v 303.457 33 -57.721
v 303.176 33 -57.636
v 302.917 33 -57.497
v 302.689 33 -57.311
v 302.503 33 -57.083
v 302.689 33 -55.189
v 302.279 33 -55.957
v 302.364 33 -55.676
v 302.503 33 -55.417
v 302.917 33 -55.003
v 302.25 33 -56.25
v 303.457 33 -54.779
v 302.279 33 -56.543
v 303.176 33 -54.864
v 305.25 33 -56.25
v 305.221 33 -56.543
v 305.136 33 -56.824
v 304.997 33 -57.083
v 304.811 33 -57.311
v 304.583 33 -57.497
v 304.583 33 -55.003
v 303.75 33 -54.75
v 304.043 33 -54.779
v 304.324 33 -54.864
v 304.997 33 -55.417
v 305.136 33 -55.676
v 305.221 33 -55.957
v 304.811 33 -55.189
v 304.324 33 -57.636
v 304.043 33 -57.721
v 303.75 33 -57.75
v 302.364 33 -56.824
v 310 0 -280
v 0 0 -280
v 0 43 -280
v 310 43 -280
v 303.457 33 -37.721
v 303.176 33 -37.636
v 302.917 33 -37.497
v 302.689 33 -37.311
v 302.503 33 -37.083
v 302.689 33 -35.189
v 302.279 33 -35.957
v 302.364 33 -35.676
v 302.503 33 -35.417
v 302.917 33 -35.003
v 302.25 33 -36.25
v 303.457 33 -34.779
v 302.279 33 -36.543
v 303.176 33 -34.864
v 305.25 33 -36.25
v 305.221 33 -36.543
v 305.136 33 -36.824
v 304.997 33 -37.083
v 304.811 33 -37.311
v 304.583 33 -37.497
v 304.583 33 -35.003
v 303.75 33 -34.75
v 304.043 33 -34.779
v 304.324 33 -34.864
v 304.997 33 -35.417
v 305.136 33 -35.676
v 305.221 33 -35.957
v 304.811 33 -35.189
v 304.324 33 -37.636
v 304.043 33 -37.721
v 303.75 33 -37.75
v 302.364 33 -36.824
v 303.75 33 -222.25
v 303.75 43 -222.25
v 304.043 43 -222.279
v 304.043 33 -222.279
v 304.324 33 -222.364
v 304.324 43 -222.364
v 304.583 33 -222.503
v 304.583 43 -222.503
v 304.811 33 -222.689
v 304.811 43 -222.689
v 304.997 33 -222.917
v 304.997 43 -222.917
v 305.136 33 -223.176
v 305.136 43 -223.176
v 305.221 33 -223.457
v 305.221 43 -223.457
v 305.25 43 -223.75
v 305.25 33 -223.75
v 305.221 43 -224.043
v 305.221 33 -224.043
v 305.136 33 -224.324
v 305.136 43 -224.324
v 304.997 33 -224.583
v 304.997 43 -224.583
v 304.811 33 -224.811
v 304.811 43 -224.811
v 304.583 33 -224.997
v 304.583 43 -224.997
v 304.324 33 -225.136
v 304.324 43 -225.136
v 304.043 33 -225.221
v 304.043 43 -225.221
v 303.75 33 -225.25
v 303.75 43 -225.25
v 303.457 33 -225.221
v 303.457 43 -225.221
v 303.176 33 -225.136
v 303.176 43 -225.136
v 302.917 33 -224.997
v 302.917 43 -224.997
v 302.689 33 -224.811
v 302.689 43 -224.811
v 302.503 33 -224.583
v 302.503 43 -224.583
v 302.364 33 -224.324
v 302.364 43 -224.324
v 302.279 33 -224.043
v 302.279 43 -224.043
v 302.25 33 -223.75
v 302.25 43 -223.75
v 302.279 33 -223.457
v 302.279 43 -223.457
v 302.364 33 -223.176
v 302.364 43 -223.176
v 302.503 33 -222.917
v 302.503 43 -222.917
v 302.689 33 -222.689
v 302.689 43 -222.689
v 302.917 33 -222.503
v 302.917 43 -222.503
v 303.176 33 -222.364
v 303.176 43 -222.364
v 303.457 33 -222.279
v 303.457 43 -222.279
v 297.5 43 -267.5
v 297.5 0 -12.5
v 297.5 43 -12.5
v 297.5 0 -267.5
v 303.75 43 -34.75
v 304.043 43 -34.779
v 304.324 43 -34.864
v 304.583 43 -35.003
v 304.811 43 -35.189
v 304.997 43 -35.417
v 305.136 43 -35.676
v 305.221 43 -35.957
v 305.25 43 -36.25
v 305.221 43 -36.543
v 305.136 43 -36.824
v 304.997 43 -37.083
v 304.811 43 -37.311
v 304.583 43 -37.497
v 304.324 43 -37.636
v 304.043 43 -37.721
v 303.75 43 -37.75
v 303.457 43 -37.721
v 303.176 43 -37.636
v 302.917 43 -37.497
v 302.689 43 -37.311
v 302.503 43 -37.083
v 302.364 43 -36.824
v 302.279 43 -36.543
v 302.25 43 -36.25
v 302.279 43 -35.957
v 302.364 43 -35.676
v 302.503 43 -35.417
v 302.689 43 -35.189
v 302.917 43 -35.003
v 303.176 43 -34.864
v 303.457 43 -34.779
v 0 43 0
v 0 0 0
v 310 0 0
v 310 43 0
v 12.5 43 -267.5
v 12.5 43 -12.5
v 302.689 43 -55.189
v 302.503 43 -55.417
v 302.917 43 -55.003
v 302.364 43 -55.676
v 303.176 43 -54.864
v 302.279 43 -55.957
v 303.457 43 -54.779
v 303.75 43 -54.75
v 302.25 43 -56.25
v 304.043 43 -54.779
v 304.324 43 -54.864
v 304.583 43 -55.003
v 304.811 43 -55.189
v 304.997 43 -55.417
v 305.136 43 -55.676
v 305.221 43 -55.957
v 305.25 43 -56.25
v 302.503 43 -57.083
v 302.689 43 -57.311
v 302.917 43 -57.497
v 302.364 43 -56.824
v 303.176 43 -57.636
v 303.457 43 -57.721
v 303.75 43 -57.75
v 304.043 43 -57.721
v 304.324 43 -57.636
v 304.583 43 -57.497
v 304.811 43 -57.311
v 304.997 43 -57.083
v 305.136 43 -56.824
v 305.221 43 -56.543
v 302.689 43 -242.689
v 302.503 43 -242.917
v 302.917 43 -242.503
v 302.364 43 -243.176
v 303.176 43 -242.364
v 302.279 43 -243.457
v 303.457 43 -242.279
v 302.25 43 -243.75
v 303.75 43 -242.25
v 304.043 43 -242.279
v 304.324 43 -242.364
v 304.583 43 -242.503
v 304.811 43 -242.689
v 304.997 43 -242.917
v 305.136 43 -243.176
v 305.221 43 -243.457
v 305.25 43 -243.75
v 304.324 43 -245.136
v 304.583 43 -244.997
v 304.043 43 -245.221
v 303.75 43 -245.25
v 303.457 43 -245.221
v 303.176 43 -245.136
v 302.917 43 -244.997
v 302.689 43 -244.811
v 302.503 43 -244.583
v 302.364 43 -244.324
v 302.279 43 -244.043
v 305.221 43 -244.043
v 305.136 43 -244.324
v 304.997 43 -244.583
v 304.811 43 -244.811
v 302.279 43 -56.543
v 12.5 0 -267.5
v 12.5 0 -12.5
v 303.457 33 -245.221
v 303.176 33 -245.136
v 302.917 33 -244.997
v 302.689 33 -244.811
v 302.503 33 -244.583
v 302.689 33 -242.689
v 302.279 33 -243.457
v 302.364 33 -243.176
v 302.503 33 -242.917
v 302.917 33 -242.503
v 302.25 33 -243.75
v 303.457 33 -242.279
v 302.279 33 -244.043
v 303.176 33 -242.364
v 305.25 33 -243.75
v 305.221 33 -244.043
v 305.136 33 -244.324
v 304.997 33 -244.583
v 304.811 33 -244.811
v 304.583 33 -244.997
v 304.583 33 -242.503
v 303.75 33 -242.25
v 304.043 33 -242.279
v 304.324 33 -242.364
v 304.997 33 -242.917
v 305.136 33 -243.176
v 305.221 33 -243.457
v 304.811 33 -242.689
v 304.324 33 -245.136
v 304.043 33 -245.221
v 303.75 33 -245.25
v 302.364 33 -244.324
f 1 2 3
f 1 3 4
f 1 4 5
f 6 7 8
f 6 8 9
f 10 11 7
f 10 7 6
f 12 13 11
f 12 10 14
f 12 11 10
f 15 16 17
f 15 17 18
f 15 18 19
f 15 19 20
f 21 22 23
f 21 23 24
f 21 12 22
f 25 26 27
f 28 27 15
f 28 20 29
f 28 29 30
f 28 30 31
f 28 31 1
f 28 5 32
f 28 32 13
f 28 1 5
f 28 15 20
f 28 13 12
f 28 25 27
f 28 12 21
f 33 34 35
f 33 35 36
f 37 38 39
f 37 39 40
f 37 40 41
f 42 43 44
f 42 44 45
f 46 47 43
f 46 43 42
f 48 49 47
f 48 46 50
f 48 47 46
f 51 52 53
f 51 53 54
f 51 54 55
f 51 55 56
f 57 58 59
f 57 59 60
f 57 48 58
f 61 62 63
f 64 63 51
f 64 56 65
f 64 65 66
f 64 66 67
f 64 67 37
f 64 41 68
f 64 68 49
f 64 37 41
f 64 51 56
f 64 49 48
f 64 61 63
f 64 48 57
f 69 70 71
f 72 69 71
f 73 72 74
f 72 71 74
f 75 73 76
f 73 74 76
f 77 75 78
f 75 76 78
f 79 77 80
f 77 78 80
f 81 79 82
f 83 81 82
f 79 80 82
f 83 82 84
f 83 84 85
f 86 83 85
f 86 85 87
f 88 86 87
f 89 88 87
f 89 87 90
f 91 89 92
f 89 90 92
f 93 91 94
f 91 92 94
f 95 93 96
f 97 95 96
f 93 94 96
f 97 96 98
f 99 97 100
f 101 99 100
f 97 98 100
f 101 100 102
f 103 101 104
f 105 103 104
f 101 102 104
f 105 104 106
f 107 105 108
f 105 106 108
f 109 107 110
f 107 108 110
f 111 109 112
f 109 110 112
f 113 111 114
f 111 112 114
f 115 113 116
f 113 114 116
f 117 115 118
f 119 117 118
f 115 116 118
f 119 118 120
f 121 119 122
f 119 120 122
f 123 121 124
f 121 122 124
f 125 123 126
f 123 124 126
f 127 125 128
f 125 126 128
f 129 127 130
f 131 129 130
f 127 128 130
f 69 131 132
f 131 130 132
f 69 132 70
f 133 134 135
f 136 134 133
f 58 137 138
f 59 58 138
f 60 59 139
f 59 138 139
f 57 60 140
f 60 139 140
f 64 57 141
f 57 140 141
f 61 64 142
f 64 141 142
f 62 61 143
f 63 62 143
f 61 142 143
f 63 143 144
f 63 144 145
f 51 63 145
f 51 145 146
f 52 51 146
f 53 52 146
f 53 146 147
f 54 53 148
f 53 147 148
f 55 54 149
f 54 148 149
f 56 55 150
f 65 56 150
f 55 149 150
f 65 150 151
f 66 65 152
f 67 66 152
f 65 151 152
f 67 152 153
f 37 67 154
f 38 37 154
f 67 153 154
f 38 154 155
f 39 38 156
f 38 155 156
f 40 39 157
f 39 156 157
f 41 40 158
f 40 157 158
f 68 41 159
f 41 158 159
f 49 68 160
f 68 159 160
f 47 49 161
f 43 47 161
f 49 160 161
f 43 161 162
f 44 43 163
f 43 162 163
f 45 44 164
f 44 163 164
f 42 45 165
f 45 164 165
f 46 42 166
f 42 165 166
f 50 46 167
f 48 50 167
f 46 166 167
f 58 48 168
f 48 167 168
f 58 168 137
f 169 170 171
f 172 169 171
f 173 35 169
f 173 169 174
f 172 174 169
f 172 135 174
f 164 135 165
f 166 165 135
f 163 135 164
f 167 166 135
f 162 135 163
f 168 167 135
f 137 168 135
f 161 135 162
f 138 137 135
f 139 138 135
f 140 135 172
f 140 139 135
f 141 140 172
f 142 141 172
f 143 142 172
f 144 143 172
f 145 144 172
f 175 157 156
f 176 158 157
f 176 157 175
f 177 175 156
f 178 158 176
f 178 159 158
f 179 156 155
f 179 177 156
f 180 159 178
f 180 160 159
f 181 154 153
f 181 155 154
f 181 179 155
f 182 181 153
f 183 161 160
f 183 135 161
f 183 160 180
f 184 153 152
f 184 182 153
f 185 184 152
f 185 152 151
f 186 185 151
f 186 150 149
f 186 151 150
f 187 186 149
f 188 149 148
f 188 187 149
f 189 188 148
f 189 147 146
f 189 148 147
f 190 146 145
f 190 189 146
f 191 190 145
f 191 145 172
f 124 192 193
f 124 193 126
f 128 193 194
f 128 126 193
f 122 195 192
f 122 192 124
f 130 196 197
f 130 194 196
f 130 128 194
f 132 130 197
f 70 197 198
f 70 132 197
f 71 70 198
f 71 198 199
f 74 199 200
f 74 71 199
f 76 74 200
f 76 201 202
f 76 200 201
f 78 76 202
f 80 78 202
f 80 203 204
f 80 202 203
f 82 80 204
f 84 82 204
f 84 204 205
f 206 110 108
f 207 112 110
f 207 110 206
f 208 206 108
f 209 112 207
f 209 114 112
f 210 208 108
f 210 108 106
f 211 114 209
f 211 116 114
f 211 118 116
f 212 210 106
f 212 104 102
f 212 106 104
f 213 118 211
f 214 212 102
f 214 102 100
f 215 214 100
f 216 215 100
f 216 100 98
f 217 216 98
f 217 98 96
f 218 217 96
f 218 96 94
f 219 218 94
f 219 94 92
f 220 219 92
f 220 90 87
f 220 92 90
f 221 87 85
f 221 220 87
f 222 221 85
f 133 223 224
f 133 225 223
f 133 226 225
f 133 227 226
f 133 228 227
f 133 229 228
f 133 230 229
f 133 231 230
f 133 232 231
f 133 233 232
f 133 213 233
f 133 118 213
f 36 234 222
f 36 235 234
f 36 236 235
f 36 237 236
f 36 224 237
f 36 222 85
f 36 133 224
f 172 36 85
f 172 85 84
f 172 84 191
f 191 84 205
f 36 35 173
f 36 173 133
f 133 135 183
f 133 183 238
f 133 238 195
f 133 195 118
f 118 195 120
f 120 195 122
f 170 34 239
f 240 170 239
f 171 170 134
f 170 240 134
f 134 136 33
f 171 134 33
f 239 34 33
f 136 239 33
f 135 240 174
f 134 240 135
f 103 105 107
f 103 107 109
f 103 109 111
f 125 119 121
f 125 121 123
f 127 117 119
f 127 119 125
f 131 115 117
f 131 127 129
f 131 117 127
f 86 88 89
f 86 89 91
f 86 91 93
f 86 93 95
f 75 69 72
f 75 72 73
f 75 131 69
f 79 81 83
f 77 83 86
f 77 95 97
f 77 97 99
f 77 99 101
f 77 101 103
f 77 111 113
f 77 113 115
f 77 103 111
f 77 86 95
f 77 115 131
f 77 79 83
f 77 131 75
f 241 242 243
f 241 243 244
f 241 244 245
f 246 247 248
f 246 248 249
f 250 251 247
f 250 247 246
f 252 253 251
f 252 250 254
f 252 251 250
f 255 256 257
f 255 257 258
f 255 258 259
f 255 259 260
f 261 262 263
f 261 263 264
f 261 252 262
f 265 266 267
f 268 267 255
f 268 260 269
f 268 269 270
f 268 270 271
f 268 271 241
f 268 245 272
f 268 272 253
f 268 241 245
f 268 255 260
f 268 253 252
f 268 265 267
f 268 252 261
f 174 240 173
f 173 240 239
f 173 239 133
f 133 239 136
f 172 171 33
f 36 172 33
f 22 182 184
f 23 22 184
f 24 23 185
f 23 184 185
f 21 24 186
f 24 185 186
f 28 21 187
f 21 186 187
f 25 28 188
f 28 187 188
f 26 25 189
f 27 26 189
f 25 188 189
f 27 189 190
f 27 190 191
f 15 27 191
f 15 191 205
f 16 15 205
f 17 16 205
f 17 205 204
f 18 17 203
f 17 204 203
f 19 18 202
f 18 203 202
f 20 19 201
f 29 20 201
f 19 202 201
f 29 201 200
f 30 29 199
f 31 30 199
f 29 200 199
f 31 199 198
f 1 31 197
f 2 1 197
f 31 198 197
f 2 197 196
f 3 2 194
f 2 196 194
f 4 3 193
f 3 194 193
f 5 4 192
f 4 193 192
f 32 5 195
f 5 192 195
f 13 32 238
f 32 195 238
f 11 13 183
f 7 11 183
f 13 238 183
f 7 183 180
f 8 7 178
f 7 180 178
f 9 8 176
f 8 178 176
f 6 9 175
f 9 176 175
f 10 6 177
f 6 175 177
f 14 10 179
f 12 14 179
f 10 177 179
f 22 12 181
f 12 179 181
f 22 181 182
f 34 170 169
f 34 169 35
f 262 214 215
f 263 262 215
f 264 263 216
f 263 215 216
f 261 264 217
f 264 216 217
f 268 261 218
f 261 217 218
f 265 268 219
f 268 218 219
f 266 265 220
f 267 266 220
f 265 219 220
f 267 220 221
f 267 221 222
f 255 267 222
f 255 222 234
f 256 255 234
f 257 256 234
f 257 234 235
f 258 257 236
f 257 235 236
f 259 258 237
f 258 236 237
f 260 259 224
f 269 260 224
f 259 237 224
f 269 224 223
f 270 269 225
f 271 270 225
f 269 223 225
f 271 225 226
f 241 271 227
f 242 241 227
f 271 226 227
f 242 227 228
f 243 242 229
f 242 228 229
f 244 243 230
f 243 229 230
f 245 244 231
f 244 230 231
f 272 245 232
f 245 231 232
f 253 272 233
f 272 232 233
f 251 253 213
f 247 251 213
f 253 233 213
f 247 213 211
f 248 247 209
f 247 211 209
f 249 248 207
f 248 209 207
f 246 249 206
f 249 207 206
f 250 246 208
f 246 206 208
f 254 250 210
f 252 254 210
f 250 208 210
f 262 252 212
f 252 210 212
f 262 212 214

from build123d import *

# Parameters (mm, degrees)
SKETCH1_W           = 310
SKETCH1_H           = 280
SKETCH1_W_2         = 285
SKETCH1_H_2         = 255
BOSS_EXTRUDE1_DEPTH = 43
SKETCH2_R           = 1.5
CUT_EXTRUDE1_DEPTH  = 10


with BuildPart() as part:
    # Sketch1 → Boss-Extrude1 (new body)
    with BuildSketch(Plane(origin=(0, 0, 0), x_dir=(1, 0, 0), z_dir=(0, 1, 0))):
        with Locations((155, 140)):
            Rectangle(SKETCH1_W, SKETCH1_H)
        with Locations((155, 140)):
            Rectangle(SKETCH1_W_2, SKETCH1_H_2, mode=Mode.SUBTRACT)
    extrude(amount=BOSS_EXTRUDE1_DEPTH)

    # Sketch2 → Cut-Extrude1 (cut)
    with BuildSketch(Plane(origin=(0, 43, 0), x_dir=(1, 0, 0), z_dir=(0, 1, 0))):
        with Locations(Location((303.75, 243.75, 0), (0, 0, 270))):
            Circle(SKETCH2_R)
        with Locations(Location((303.75, 223.75, 0), (0, 0, 270))):
            Circle(SKETCH2_R)
        with Locations(Location((303.75, 56.25, 0), (0, 0, 270))):
            Circle(SKETCH2_R)
        with Locations(Location((303.75, 36.25, 0), (0, 0, 270))):
            Circle(SKETCH2_R)
    extrude(amount=-CUT_EXTRUDE1_DEPTH, mode=Mode.SUBTRACT)


solid = part.part
